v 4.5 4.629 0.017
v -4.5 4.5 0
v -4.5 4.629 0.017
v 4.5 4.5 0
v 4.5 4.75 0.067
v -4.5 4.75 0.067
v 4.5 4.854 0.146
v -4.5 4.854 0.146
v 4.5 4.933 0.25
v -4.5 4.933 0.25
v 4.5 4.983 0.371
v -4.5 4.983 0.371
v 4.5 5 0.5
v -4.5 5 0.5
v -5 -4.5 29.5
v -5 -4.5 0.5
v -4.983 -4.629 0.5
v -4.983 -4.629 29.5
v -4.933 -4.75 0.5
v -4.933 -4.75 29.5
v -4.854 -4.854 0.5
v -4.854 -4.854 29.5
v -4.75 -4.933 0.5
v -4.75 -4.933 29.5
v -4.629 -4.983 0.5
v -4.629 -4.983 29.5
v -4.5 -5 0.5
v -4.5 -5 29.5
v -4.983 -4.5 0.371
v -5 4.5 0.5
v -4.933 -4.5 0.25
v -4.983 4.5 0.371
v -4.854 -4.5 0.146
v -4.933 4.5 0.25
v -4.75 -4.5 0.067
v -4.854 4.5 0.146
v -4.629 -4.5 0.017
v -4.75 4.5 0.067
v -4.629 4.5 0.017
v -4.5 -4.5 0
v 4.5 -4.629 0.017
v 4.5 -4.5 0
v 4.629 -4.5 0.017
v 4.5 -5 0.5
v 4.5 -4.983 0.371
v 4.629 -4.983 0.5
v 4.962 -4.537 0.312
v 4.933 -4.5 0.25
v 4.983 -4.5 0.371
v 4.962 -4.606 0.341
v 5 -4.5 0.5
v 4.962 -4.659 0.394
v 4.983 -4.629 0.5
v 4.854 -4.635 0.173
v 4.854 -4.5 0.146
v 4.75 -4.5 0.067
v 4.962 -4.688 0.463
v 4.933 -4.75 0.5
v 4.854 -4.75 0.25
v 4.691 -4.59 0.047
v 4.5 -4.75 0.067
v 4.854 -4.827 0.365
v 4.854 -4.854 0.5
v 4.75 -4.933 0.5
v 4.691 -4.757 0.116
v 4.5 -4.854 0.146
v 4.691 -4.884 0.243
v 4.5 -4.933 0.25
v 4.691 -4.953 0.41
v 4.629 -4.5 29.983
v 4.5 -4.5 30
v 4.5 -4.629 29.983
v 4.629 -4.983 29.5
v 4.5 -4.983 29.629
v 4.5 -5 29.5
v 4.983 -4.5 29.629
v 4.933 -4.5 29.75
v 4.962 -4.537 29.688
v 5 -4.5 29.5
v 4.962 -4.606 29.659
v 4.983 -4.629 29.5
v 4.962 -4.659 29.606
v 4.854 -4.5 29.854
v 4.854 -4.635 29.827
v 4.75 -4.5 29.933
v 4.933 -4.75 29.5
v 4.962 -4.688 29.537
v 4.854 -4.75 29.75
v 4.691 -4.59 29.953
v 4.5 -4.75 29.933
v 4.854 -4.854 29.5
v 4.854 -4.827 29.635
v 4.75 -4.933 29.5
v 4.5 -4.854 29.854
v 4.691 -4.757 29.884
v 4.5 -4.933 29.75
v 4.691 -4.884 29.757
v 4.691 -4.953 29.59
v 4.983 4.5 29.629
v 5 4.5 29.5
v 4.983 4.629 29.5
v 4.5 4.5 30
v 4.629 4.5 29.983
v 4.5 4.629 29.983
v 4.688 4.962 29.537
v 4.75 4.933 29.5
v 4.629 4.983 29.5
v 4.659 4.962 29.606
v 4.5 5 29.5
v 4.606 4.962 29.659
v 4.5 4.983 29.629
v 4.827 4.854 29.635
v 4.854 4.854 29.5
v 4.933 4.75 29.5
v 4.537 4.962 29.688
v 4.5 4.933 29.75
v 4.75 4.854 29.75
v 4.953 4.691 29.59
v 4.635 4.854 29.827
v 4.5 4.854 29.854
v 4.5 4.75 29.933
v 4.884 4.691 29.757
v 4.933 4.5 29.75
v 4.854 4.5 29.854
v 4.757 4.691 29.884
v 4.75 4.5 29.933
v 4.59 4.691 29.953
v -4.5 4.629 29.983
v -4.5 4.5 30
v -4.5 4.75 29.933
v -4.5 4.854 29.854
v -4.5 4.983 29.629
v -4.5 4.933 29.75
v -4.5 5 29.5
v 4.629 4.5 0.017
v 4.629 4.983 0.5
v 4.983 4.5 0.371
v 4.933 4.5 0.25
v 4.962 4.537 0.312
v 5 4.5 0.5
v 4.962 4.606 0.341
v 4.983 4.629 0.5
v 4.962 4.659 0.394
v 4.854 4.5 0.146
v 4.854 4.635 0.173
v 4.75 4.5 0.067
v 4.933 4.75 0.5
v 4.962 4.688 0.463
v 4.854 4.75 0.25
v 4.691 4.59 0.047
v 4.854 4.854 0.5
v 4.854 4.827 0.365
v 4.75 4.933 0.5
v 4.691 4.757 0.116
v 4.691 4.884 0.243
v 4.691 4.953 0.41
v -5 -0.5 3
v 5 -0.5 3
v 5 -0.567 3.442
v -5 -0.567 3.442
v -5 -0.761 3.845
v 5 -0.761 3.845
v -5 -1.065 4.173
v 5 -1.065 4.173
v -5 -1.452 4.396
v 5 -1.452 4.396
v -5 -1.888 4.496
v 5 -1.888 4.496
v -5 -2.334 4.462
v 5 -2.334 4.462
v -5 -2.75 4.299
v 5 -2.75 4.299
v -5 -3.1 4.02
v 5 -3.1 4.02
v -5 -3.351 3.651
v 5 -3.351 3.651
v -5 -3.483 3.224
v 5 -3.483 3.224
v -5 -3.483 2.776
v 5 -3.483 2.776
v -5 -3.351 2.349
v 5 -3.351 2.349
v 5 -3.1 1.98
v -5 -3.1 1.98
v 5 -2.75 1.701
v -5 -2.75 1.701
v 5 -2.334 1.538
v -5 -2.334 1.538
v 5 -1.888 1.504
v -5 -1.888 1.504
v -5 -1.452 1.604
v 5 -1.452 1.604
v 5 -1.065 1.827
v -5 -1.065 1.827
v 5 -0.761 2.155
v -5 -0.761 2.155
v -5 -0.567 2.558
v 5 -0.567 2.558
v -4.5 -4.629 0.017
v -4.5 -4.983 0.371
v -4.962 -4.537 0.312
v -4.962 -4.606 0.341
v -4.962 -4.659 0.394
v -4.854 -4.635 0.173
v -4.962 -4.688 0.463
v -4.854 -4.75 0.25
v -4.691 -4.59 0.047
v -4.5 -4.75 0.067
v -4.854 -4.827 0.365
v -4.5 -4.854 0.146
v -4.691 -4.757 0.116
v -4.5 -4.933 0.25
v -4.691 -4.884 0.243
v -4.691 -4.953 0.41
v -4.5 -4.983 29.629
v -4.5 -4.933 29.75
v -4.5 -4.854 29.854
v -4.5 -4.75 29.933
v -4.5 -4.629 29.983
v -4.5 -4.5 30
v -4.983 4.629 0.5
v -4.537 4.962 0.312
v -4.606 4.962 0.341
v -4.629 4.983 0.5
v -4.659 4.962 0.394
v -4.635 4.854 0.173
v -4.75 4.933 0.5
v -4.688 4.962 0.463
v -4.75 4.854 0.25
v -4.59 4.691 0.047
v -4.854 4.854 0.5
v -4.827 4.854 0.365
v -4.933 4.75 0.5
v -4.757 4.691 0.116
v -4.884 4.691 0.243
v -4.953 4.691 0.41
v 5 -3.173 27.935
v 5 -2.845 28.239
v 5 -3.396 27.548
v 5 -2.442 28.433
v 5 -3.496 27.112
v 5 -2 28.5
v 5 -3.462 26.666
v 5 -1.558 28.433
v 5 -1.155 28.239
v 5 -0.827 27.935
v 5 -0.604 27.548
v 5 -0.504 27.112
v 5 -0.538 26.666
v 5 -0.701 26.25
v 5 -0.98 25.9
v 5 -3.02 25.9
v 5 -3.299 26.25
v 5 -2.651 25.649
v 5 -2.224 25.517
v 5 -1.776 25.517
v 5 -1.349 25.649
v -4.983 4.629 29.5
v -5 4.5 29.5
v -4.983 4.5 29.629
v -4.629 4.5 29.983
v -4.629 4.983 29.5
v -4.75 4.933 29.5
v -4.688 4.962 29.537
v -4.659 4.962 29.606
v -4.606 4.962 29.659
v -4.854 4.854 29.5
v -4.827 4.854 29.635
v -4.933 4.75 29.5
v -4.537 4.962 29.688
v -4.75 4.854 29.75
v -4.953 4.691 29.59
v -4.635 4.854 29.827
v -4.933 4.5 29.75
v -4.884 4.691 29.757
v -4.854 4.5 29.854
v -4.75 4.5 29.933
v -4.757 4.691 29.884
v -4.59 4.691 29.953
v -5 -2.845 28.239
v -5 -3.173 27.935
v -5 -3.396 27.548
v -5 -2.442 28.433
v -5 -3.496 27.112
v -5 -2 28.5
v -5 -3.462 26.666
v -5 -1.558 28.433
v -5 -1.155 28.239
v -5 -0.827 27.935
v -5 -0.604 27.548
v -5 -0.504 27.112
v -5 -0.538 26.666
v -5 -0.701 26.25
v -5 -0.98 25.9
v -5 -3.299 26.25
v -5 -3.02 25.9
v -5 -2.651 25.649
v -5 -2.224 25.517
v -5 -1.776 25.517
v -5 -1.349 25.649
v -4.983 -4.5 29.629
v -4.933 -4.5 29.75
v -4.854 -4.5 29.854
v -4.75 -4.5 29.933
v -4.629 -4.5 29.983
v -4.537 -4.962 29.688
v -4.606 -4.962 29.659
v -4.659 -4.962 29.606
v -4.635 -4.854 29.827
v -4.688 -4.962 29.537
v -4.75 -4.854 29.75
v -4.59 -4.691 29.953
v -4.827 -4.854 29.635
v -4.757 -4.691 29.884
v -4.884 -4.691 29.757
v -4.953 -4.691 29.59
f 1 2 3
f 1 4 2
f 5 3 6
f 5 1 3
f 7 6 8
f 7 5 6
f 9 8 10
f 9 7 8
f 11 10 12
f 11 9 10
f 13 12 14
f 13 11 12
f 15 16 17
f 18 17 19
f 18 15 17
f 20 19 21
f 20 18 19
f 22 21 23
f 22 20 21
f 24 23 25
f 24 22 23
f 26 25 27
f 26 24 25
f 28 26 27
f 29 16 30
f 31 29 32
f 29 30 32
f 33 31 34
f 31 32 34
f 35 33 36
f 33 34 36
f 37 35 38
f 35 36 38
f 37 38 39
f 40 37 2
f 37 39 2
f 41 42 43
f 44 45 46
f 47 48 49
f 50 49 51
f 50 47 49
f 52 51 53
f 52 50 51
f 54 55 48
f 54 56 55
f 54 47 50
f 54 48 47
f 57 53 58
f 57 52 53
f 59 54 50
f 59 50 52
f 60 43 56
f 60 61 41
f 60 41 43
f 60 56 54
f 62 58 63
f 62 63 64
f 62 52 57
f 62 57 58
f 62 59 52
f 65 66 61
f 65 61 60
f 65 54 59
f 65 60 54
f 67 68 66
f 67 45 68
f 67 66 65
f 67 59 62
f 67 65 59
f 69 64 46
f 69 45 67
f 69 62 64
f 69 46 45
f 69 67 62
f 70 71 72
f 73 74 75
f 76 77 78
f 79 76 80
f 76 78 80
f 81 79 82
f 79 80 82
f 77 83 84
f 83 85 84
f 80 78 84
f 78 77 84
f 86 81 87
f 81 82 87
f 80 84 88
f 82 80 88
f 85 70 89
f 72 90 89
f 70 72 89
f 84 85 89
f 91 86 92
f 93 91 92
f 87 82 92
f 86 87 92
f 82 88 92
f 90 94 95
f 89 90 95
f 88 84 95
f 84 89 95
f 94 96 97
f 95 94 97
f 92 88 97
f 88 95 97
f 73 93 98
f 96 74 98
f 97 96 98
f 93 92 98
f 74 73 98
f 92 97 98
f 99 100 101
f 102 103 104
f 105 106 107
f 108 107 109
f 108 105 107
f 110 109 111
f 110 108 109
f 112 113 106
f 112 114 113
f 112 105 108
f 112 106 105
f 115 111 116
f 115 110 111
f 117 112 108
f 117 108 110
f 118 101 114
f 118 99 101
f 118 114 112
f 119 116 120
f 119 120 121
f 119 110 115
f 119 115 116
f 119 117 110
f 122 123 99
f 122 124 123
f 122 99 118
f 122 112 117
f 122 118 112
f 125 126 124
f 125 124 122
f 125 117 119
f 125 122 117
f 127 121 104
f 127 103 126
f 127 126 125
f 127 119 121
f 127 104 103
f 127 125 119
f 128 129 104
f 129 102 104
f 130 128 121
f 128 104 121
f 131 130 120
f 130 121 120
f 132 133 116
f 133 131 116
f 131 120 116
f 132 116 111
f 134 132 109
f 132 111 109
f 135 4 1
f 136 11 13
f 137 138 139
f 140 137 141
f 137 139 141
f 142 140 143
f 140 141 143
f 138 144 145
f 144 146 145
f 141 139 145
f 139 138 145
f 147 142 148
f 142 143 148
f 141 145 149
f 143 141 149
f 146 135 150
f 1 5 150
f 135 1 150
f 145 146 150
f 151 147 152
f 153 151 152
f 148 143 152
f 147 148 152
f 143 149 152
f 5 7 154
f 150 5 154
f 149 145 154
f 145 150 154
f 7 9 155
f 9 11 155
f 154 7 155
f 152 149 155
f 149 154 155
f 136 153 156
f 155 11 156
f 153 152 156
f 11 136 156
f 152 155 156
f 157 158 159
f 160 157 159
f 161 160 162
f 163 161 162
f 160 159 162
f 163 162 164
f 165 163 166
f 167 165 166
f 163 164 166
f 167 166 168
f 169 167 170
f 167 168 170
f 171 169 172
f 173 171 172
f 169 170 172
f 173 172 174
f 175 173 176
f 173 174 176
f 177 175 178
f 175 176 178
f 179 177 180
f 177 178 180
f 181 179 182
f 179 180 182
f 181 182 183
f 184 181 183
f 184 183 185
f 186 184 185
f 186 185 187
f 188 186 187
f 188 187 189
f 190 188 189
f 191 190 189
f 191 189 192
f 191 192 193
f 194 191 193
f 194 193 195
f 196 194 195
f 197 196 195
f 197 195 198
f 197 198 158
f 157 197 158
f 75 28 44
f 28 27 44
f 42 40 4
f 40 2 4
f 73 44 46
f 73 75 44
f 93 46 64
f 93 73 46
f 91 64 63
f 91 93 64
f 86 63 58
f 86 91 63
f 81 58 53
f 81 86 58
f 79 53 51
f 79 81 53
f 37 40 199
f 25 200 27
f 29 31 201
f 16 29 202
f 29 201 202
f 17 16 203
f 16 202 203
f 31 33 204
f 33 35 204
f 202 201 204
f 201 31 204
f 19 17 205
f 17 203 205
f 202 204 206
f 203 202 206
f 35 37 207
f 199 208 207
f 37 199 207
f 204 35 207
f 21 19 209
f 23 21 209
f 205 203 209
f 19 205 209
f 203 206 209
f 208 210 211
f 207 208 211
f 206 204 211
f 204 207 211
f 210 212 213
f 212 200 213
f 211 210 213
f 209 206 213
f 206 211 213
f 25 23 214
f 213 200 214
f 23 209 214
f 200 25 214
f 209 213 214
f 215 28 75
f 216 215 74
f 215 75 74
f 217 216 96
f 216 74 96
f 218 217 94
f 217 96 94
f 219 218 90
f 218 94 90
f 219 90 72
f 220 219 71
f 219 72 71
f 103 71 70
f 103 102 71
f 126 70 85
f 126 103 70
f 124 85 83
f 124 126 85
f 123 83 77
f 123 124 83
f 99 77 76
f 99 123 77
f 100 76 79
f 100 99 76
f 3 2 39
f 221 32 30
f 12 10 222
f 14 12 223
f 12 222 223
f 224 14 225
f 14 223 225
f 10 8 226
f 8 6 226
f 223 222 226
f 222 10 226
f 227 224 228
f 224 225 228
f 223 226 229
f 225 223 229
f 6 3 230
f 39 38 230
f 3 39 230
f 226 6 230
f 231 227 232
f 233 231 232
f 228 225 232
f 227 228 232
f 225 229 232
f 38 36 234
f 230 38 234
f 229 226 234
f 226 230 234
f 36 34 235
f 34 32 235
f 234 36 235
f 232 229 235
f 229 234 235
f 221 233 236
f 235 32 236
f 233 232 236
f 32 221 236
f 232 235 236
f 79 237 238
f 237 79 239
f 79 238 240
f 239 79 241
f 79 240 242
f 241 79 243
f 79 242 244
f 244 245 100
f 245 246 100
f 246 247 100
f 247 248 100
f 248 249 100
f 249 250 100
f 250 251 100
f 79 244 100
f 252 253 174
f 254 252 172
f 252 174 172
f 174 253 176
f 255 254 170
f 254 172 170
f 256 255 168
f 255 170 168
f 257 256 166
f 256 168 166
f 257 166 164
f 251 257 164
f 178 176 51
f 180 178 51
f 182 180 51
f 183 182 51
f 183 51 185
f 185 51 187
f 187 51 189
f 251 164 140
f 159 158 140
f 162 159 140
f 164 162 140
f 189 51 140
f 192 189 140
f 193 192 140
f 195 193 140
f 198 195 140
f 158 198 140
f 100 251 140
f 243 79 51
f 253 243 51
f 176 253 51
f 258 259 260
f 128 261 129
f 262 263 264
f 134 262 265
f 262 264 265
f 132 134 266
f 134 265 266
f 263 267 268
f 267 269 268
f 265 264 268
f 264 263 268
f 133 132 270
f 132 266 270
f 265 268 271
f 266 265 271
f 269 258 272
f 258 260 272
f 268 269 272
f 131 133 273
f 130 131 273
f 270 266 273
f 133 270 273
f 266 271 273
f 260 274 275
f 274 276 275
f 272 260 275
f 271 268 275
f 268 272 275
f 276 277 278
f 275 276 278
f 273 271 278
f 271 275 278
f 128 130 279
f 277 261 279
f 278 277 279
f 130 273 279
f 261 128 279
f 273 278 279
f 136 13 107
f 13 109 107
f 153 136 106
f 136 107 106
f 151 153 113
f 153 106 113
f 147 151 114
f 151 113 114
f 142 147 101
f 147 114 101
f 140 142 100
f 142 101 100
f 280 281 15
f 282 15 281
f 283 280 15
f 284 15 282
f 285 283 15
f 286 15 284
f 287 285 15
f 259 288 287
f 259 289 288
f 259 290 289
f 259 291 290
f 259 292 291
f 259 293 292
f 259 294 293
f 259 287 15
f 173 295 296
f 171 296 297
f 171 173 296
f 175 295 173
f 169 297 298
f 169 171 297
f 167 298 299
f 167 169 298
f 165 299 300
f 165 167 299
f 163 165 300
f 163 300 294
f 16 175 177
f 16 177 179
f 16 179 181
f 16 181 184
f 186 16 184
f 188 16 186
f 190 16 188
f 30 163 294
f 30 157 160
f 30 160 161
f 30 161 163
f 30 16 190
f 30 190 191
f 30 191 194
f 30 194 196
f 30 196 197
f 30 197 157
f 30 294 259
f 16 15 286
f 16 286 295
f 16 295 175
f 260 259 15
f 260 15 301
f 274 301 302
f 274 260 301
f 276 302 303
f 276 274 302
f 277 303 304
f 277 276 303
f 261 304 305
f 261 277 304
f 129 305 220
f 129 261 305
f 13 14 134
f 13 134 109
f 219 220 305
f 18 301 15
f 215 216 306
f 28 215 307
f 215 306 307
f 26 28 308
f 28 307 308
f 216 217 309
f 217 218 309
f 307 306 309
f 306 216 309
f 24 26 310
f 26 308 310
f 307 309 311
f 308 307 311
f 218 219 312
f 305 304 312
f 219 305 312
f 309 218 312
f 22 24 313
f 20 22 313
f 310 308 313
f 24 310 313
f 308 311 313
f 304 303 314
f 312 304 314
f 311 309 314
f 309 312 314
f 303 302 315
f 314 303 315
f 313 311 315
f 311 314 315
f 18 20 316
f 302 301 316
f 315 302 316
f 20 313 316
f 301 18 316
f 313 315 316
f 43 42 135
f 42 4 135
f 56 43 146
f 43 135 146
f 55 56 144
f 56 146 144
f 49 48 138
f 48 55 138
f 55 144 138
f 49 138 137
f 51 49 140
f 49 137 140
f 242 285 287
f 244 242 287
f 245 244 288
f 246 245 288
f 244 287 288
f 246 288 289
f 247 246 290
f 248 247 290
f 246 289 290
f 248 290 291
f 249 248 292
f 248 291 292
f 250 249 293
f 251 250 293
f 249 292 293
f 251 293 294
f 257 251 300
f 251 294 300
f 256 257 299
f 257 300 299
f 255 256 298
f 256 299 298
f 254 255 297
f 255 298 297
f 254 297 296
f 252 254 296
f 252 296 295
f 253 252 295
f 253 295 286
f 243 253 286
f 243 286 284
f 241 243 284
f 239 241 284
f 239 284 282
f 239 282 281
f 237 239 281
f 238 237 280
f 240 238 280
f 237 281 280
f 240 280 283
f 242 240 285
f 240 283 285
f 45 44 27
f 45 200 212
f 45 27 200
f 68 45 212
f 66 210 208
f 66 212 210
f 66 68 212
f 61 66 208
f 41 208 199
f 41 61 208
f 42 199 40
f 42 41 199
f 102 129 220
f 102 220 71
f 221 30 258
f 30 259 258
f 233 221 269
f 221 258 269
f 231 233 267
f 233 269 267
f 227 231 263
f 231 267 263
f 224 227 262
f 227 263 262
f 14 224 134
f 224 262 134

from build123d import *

# Parameters (mm, degrees)
ESQUISSE1_W             = 10
ESQUISSE1_H             = 10
BOSS_EXTRU_1_DEPTH      = 30
ESQUISSE2_R             = 1.5
ENL_V_MAT_EXTRU_1_DEPTH = 30
CONG_1_R                = 0.5
ESQUISSE3_R             = 1.5
ENL_V_MAT_EXTRU_2_DEPTH = 10


with BuildPart() as part:
    # Esquisse1 → Boss.-Extru.1 (new body)
    with BuildSketch(Plane.XY):
        Rectangle(ESQUISSE1_W, ESQUISSE1_H)
    extrude(amount=BOSS_EXTRU_1_DEPTH)

    # Esquisse2 → Enlèv. mat.-Extru.1 (cut)
    with BuildSketch(Plane(origin=(5, 0, 0), x_dir=(0, 0, -1), z_dir=(1, 0, 0))):
        with Locations(Location((-3, -2, 0), (0, 0, 90))):
            Circle(ESQUISSE2_R)
    extrude(amount=-ENL_V_MAT_EXTRU_1_DEPTH, mode=Mode.SUBTRACT)

    # Congé1
    cong_1_edges = [part.edges().sort_by_distance(p)[0] for p in [
        (-5, 0, 30),
        (0, -5, 30),
        (5, 0, 30),
        (0, -5, 0),
        (-5, 0, 0),
        (0, 5, 0),
        (5, 0, 0),
        (5, -5, 15),
        (-5, -5, 15),
        (-5, 5, 15),
        (5, 5, 15),
        (0, 5, 30),
    ]]
    fillet(cong_1_edges, radius=CONG_1_R)

    # Esquisse3 → Enlèv. mat.-Extru.2 (cut)
    with BuildSketch(Plane.ZY.offset(5)):
        with Locations((27, -2)):
            Circle(ESQUISSE3_R)
    extrude(amount=-ENL_V_MAT_EXTRU_2_DEPTH, mode=Mode.SUBTRACT)


solid = part.part
